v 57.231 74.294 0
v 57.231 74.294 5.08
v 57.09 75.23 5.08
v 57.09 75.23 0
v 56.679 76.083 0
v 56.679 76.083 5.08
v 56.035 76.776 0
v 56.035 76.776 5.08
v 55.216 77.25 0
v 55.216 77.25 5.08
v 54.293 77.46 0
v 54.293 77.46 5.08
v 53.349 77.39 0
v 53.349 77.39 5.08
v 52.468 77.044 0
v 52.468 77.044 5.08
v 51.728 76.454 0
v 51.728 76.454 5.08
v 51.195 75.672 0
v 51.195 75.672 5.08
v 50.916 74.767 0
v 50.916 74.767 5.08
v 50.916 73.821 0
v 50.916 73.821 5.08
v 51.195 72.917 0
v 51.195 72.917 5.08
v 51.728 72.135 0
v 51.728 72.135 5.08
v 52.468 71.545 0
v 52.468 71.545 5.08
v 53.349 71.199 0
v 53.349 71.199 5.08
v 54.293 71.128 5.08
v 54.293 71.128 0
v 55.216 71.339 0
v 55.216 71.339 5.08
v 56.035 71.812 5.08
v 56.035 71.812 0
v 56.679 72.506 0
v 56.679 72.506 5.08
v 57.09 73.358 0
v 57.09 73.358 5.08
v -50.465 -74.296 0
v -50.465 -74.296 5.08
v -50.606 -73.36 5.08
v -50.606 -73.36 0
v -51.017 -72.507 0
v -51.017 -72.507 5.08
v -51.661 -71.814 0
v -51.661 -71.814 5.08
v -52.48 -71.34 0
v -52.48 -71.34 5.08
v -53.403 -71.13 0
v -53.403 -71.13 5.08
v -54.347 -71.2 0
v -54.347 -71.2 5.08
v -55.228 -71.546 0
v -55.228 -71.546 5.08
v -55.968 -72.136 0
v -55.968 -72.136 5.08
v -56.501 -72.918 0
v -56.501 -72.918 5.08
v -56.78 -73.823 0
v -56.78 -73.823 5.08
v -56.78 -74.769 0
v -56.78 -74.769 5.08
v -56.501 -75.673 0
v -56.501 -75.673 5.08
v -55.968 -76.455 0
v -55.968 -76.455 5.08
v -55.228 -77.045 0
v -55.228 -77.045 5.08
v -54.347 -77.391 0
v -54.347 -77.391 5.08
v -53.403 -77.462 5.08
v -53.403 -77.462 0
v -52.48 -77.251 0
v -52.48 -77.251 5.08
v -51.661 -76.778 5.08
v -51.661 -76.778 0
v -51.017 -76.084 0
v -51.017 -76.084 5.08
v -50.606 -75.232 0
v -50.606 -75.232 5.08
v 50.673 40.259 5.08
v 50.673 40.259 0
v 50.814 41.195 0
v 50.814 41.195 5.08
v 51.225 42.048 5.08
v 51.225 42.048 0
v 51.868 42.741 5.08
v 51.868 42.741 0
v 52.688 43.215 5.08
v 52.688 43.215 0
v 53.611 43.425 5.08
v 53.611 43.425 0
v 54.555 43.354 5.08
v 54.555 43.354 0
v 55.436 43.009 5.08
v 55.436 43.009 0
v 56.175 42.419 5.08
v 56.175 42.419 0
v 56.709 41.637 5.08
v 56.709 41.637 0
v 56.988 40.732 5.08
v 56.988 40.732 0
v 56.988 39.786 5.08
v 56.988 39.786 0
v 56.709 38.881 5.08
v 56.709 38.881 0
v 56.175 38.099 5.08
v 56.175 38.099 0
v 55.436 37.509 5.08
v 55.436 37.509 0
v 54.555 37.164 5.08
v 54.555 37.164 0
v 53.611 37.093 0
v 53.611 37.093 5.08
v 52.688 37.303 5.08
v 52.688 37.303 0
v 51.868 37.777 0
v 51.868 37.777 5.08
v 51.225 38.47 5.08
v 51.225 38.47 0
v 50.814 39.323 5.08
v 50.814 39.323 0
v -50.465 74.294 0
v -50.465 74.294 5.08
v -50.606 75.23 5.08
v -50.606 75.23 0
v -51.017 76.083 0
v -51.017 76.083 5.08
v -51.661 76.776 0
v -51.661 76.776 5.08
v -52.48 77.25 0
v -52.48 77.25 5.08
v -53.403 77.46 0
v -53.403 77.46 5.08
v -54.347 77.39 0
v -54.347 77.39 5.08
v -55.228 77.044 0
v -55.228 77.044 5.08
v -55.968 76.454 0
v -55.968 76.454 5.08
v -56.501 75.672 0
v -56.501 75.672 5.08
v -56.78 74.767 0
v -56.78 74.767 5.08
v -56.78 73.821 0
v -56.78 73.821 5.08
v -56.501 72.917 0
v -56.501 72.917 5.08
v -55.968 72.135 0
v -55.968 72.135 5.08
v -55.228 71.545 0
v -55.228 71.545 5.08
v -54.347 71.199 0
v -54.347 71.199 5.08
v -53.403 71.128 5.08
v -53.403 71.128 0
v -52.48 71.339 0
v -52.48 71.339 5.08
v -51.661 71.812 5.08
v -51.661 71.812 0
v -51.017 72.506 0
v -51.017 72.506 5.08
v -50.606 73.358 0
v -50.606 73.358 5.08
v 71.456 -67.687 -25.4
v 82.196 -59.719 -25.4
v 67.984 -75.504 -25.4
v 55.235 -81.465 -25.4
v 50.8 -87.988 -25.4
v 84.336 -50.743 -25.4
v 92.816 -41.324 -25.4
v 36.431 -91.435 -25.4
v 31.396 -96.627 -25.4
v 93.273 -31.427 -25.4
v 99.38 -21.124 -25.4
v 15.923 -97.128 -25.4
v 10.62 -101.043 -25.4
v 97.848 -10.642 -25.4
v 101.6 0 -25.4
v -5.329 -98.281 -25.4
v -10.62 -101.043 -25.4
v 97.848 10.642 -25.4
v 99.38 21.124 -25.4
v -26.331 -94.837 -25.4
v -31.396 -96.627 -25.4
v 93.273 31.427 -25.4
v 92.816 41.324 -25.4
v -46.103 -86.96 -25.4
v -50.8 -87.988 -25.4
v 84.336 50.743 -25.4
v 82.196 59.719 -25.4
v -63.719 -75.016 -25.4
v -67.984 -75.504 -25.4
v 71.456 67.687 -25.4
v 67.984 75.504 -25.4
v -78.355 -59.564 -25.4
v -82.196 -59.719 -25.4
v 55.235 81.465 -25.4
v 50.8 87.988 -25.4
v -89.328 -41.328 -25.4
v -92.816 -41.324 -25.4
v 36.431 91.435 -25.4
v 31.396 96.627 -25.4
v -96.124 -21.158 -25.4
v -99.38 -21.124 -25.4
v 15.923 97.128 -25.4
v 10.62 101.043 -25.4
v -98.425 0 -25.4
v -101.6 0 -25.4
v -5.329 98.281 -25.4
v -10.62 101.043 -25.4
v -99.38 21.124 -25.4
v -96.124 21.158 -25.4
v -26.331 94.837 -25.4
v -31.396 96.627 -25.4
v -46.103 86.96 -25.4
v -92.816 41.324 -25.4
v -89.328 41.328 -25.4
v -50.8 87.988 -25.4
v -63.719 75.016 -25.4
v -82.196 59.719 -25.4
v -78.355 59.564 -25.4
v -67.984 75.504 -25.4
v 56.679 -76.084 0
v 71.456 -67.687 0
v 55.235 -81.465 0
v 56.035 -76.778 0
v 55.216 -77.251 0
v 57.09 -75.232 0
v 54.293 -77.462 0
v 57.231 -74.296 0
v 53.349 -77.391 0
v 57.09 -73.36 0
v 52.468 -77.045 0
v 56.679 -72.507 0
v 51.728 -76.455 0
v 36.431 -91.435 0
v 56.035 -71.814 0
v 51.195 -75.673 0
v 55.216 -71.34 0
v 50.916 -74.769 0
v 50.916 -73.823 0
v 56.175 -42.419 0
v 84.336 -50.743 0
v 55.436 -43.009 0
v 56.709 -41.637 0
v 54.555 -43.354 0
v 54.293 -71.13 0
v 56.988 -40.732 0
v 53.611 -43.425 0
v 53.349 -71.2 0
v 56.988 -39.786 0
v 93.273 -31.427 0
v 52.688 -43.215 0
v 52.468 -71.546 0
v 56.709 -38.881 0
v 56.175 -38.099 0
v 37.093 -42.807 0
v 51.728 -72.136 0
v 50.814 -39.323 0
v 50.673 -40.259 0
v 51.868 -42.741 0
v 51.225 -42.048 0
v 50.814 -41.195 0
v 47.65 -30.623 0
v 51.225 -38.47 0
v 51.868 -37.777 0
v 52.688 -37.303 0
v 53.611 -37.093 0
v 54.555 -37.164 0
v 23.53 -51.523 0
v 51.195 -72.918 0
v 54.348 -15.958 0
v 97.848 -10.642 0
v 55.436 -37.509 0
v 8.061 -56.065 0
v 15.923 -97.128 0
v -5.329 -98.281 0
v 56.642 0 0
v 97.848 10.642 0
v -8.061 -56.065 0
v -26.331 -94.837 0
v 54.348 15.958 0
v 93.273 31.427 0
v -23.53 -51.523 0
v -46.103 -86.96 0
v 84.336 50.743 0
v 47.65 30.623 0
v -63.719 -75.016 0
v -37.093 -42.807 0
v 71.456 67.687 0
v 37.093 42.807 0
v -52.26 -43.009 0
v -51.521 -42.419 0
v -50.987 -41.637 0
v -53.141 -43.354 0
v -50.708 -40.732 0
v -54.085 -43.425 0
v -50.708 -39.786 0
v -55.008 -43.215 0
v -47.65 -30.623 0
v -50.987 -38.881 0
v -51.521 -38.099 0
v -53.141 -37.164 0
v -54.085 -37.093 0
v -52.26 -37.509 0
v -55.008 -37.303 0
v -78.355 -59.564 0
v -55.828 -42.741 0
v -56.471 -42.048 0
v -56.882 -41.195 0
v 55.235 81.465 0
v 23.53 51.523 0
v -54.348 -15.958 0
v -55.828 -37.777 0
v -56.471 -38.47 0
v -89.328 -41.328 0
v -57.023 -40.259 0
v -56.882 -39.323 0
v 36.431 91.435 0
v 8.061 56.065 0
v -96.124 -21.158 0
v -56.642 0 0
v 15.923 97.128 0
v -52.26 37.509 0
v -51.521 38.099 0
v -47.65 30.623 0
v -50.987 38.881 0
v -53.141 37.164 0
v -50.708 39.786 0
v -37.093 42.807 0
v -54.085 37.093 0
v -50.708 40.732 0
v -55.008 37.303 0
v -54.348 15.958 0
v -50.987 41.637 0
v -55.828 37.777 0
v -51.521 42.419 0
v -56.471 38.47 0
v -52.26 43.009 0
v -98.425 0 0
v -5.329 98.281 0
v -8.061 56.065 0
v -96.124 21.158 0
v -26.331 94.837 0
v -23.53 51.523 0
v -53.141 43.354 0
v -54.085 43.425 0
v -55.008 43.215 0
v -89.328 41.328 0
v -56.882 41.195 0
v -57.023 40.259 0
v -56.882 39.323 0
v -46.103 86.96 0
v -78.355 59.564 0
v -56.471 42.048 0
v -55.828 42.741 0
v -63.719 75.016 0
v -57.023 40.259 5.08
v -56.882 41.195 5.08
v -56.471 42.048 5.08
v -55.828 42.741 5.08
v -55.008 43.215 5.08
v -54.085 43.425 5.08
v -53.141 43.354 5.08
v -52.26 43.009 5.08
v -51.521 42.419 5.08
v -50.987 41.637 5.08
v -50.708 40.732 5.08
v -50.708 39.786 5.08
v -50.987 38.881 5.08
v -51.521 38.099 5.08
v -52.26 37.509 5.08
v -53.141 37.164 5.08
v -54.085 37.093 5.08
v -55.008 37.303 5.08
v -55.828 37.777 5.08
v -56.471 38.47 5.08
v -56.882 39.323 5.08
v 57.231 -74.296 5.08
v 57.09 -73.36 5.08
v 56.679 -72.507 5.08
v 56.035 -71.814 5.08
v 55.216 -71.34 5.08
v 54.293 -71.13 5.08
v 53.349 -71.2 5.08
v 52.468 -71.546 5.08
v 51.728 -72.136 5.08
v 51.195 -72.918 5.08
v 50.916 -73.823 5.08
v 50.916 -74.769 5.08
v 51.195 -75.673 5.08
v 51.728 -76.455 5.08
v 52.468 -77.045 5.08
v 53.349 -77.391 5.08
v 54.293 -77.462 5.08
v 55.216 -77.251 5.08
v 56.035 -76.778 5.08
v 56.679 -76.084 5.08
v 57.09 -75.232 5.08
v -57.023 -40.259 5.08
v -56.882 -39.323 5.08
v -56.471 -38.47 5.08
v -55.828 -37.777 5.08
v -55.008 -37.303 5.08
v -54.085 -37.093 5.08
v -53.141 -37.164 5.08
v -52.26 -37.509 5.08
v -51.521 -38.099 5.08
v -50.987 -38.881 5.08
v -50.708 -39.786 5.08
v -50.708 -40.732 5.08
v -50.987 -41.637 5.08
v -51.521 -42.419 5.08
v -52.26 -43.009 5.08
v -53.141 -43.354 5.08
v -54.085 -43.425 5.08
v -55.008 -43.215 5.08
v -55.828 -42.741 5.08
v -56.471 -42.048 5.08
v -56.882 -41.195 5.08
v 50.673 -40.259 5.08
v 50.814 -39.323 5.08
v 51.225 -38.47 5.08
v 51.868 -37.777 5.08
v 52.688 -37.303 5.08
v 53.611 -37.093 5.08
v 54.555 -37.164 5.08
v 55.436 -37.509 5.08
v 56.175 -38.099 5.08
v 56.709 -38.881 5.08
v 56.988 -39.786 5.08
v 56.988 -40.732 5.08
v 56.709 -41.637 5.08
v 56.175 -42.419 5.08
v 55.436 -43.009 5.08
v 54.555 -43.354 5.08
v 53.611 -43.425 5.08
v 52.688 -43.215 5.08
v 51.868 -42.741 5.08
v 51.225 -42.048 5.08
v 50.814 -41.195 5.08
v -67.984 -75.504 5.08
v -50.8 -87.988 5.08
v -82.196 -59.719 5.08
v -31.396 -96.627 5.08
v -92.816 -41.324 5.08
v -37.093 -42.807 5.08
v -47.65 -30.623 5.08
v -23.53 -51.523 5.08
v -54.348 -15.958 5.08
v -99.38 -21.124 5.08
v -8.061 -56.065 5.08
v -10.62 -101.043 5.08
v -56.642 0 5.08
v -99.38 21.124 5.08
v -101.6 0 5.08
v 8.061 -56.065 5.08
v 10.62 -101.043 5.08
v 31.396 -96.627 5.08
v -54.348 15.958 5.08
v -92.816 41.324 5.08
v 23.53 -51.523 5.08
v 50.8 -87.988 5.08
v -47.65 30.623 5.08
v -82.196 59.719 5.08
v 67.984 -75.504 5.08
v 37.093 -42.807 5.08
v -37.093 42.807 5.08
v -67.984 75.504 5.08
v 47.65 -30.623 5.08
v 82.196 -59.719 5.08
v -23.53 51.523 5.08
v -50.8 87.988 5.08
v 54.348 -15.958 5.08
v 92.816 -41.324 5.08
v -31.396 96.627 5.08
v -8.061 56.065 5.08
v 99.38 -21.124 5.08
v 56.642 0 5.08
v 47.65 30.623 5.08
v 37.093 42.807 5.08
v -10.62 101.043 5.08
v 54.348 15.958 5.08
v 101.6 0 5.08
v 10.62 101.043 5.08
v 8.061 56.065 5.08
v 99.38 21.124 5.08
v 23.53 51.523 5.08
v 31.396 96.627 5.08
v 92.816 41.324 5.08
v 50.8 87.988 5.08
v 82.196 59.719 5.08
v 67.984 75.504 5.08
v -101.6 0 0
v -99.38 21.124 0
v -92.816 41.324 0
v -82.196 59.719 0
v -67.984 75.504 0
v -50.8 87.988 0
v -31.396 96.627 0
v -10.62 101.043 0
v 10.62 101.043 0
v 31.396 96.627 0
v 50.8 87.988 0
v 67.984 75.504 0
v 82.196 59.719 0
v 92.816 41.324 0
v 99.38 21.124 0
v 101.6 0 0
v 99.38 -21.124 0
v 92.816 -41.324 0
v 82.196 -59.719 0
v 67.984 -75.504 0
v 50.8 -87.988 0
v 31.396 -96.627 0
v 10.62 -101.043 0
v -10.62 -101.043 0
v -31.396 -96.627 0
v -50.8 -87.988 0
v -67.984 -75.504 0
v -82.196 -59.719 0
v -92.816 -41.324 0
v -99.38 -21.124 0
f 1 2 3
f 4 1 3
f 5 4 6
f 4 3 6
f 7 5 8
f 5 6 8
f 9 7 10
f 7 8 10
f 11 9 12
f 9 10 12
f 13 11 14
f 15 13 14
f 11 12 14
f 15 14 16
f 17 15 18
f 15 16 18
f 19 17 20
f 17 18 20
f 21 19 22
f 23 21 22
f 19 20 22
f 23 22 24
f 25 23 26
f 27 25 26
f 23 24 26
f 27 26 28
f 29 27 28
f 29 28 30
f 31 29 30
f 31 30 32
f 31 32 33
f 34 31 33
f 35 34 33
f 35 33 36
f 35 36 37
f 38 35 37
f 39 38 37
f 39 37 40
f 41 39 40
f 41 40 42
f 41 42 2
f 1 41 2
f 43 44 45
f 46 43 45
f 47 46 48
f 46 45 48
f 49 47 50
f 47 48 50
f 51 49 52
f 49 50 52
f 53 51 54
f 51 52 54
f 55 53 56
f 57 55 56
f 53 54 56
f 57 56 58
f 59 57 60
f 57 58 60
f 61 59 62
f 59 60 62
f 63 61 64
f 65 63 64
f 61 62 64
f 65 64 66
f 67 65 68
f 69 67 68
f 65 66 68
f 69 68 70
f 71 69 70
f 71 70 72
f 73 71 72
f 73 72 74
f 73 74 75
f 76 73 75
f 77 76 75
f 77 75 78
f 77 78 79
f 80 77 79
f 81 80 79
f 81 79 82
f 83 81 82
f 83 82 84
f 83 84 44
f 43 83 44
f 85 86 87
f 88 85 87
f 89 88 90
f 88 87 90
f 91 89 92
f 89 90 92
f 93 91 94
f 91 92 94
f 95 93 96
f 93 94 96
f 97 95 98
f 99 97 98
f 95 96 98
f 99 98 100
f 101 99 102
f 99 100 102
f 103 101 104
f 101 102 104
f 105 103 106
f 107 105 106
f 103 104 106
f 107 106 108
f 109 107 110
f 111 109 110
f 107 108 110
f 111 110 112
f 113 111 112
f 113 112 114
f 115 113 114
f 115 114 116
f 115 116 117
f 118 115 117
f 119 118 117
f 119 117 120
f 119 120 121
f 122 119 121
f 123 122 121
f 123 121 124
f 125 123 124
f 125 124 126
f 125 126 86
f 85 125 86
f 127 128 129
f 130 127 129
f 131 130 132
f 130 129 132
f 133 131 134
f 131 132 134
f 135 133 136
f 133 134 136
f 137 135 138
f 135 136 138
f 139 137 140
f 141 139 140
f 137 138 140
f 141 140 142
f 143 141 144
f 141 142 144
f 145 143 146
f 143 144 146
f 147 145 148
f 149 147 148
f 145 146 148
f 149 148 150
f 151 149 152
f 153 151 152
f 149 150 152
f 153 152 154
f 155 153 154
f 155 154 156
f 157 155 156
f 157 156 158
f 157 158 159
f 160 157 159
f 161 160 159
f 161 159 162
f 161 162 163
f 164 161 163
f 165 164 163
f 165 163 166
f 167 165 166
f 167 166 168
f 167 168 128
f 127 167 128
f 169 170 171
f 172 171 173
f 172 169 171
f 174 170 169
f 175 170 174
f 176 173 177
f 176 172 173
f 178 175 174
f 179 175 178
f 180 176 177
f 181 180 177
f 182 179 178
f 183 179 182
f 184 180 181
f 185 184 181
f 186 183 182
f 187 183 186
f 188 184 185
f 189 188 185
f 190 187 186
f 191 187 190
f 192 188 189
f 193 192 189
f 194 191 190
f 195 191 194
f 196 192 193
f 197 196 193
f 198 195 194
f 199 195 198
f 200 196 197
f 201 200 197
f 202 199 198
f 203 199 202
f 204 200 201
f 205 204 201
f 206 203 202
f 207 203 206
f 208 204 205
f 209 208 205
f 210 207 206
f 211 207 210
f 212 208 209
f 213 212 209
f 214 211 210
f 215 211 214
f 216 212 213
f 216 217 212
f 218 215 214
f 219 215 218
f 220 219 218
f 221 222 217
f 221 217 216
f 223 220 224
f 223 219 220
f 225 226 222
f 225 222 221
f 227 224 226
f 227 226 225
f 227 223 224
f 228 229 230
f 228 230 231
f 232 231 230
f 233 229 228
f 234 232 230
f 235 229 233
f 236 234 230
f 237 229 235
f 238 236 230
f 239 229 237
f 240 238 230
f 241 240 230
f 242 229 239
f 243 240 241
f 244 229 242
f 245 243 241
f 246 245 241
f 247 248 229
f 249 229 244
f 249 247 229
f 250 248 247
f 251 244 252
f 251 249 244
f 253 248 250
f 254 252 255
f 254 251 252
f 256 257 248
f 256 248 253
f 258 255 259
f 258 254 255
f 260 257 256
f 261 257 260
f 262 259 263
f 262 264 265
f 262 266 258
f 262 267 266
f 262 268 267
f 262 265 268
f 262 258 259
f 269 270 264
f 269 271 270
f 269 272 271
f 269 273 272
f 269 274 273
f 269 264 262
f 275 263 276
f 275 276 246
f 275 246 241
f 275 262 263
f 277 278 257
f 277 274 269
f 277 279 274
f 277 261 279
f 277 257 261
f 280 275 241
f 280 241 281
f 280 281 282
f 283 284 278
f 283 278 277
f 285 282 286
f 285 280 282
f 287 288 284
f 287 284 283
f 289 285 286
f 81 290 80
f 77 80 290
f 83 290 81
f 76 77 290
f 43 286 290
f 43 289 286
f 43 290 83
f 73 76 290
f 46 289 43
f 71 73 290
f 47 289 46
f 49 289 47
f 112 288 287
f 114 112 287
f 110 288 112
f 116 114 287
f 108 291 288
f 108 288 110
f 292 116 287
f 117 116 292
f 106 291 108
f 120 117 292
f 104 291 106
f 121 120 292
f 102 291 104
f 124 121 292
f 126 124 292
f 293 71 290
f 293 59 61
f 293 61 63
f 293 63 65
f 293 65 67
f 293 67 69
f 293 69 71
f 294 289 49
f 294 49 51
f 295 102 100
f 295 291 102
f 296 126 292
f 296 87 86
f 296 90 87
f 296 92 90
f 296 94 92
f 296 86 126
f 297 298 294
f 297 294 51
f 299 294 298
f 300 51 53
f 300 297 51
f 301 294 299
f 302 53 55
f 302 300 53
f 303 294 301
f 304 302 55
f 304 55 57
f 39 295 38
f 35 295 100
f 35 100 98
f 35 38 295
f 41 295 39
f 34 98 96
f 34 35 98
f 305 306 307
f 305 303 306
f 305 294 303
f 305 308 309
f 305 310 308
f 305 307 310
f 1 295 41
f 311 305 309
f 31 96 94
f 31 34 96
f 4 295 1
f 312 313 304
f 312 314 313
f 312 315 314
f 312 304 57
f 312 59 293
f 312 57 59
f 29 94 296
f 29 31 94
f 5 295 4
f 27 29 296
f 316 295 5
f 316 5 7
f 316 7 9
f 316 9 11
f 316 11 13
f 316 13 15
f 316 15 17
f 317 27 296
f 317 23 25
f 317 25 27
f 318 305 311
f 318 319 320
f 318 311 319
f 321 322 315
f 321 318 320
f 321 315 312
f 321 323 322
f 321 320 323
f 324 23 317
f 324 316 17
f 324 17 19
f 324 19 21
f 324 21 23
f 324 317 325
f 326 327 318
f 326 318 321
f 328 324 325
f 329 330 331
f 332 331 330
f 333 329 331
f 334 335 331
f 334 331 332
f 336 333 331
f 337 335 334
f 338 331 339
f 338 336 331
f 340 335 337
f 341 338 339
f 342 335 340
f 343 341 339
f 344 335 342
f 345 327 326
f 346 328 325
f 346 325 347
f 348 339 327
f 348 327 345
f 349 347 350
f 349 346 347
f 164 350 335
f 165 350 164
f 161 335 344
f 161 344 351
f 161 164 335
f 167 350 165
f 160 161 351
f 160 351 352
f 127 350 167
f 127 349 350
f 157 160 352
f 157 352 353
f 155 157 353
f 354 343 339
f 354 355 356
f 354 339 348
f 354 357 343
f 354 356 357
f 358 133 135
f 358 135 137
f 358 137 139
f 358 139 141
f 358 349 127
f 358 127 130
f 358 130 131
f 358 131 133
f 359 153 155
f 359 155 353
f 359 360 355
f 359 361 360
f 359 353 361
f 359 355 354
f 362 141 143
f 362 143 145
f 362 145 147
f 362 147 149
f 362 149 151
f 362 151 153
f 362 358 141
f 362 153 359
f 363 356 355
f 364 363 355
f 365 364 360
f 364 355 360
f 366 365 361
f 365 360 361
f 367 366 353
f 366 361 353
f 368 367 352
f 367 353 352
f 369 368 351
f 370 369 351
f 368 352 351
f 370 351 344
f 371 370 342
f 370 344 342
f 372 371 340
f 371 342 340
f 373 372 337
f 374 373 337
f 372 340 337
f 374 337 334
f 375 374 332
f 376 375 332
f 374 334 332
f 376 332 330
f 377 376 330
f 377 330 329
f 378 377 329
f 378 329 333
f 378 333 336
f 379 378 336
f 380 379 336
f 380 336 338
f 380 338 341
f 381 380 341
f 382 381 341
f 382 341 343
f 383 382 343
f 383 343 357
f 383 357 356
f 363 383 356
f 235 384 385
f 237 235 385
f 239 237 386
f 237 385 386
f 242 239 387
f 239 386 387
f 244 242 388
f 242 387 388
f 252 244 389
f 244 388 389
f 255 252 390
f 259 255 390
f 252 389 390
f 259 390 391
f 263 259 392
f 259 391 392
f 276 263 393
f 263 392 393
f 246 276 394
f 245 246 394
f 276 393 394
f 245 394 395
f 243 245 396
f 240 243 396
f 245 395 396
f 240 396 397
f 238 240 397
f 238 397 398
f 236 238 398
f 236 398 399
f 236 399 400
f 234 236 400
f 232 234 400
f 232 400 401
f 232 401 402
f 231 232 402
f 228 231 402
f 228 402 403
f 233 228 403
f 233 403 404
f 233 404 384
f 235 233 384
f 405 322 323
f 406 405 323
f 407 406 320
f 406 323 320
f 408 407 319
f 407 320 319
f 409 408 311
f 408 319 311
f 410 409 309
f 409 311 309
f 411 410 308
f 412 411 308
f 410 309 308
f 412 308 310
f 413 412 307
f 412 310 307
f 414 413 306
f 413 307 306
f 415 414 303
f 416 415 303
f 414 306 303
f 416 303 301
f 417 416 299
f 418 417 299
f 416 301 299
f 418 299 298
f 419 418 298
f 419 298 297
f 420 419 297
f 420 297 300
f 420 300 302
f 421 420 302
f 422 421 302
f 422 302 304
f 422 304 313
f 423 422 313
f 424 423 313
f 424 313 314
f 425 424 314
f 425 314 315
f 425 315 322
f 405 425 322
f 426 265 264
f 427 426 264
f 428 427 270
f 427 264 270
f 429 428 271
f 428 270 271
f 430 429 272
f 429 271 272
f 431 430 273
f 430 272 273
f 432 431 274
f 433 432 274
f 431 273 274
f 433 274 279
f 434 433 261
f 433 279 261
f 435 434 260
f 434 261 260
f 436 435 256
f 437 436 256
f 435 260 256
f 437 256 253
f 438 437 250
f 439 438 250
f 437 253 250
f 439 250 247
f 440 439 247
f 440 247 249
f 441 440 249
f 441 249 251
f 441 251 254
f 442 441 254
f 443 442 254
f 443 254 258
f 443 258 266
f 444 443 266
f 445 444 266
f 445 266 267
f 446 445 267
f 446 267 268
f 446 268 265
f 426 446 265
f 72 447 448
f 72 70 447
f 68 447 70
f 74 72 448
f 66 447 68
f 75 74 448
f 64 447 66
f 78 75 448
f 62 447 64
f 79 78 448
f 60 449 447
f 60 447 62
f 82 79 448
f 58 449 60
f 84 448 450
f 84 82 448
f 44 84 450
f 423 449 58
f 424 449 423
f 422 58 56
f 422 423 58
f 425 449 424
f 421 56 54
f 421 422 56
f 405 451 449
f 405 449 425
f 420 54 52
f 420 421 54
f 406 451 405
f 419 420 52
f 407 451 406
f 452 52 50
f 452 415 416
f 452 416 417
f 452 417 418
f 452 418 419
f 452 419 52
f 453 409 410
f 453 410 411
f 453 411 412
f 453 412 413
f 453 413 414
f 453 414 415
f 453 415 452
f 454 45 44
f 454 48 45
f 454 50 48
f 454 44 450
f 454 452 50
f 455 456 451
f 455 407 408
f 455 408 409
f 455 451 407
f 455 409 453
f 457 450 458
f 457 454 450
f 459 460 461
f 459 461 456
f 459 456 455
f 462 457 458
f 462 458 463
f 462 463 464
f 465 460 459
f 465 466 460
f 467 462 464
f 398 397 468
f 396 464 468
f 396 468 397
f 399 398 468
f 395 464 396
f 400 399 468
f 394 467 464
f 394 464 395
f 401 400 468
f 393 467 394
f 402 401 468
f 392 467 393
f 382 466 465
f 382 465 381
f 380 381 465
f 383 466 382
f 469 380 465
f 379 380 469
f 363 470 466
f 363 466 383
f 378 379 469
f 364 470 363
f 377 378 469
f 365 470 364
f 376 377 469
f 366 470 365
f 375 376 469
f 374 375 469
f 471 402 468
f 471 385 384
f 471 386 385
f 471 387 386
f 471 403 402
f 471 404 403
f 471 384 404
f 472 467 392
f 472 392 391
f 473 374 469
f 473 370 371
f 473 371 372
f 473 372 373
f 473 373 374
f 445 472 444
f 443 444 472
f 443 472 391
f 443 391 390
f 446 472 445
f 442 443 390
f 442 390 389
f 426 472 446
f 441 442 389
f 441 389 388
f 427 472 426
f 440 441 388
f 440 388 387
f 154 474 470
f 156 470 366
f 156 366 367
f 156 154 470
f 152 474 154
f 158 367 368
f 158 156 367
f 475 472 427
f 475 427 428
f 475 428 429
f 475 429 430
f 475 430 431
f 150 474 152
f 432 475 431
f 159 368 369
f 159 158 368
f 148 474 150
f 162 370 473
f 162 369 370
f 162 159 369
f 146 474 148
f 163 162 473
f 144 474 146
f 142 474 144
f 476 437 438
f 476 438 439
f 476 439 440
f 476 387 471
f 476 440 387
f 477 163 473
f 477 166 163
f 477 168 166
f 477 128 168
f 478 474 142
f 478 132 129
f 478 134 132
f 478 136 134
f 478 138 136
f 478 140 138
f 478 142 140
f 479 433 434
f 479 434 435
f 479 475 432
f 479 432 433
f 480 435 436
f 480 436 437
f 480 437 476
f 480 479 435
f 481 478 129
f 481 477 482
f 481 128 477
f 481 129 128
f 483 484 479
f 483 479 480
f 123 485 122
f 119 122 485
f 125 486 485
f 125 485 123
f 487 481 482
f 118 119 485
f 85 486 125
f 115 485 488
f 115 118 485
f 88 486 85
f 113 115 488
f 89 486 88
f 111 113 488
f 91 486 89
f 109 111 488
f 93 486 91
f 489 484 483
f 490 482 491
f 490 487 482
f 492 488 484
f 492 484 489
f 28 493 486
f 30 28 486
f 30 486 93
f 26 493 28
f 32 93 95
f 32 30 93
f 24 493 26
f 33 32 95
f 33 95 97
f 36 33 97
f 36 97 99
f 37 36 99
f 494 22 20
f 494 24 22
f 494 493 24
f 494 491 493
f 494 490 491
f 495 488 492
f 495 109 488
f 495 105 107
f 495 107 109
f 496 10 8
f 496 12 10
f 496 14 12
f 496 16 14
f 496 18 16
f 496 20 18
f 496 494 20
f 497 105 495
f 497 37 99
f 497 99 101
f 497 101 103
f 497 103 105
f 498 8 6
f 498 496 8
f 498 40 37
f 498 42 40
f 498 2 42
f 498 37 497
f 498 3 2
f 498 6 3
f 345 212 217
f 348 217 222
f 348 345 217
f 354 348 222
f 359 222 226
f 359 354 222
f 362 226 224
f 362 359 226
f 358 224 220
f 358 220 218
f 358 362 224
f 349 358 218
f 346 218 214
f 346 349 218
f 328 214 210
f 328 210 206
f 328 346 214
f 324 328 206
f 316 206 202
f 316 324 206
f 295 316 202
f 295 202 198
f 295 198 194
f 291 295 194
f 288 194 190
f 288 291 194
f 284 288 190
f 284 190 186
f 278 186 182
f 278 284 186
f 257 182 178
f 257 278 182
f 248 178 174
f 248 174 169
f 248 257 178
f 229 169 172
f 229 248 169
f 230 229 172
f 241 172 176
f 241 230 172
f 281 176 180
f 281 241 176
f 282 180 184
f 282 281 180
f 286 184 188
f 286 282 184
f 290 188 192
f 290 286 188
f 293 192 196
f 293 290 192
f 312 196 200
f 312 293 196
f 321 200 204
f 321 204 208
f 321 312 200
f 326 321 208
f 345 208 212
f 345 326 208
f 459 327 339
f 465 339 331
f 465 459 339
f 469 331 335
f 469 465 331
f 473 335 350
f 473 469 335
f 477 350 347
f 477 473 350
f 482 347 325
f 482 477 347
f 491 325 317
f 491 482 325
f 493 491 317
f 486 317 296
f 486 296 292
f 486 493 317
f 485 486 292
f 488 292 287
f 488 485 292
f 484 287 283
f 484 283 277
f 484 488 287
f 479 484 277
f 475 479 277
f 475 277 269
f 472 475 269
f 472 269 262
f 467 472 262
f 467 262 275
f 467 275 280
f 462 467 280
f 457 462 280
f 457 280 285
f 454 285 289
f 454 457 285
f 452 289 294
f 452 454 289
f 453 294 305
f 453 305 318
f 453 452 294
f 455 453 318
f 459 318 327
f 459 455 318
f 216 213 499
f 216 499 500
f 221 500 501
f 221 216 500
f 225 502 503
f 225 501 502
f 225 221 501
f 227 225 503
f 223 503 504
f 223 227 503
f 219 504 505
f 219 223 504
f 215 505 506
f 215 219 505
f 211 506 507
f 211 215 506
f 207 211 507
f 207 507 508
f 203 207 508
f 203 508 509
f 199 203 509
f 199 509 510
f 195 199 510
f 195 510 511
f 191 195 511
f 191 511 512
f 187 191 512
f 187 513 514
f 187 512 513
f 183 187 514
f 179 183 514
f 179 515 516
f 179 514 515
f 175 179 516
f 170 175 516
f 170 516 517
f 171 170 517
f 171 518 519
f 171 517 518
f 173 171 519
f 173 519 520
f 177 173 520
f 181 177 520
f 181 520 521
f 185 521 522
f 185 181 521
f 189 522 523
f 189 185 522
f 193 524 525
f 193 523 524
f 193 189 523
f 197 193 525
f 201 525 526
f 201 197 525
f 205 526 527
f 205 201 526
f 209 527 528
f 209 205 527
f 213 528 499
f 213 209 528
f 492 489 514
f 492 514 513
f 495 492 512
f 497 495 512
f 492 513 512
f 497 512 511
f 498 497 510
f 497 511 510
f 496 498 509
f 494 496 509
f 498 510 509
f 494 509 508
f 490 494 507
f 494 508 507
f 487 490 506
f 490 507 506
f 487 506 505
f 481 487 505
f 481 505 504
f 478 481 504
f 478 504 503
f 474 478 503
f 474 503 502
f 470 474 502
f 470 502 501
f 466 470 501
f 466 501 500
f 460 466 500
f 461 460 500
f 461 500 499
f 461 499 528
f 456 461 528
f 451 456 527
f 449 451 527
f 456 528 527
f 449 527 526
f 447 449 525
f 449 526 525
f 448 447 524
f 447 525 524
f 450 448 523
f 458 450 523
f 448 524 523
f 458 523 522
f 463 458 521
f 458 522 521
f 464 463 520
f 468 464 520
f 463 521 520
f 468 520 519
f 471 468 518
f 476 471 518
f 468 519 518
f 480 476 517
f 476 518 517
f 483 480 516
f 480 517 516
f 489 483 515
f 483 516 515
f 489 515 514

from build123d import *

# Parameters (mm, degrees)
SKETCH1_R           = 101.6
BOSS_EXTRUDE1_DEPTH = 5.08
BOSS_EXTRUDE2_START = 25.4
SKETCH4_R           = 101.6
BOSS_EXTRUDE2_DEPTH = 25.4
SKETCH5_R           = 56.642
BOSS_EXTRUDE3_DEPTH = 12.7
CUT_EXTRUDE3_START  = -64.008
SKETCH6_R           = 56.642
CUT_EXTRUDE3_DEPTH  = 64.008
CUT_EXTRUDE6_START  = -25.4
SKETCH10_R          = 98.425
SKETCH10_R_2        = 56.642
CUT_EXTRUDE6_DEPTH  = 25.4
SKETCH16_R          = 3.175
CUT_EXTRUDE7_DEPTH  = 6.35
SKETCH17_R          = 3.175
CUT_EXTRUDE8_DEPTH  = 7.874


with BuildPart() as part:
    # Sketch1 → Boss-Extrude1 (new body)
    with BuildSketch(Plane.XY):
        Circle(SKETCH1_R)
    extrude(amount=BOSS_EXTRUDE1_DEPTH)

    # Sketch4 → Boss-Extrude2 (add)
    with BuildSketch(Plane(origin=(0, 0, 0), x_dir=(-1, 0, 0), z_dir=(0, 0, -1)).offset(BOSS_EXTRUDE2_START)):
        Circle(SKETCH4_R)
    extrude(amount=-BOSS_EXTRUDE2_DEPTH)

    # Sketch5 → Boss-Extrude3 (add)
    with BuildSketch(Plane(origin=(0, 0, -25.4), x_dir=(-1, 0, 0), z_dir=(0, 0, -1))):
        Circle(SKETCH5_R)
    extrude(amount=BOSS_EXTRUDE3_DEPTH)

    # Sketch6 → Cut-Extrude3 (cut)
    with BuildSketch(Plane(origin=(0, 0, -38.1), x_dir=(-1, 0, 0), z_dir=(0, 0, -1)).offset(CUT_EXTRUDE3_START)):
        Circle(SKETCH6_R)
    extrude(amount=CUT_EXTRUDE3_DEPTH, mode=Mode.SUBTRACT)

    # Sketch10 → Cut-Extrude6 (cut)
    with BuildSketch(Plane(origin=(0, 0, -25.4), x_dir=(-1, 0, 0), z_dir=(0, 0, -1)).offset(CUT_EXTRUDE6_START)):
        Circle(SKETCH10_R)
        Circle(SKETCH10_R_2, mode=Mode.SUBTRACT)
    extrude(amount=CUT_EXTRUDE6_DEPTH, mode=Mode.SUBTRACT)

    # Sketch16 → Cut-Extrude7 (cut)
    with BuildSketch(Plane(origin=(0, 0, 0), x_dir=(-1, 0, 0), z_dir=(0, 0, -1))):
        with Locations((53.848, 40.259)):
            Circle(SKETCH16_R)
        with Locations((-53.848, 40.259)):
            Circle(SKETCH16_R)
        with Locations((-53.848, -40.259)):
            Circle(SKETCH16_R)
        with Locations((53.848, -40.259)):
            Circle(SKETCH16_R)
    extrude(amount=-CUT_EXTRUDE7_DEPTH, mode=Mode.SUBTRACT)

    # Sketch17 → Cut-Extrude8 (cut)
    with BuildSketch(Plane.XY.offset(5.08)):
        with Locations((54.055769112, 74.294164254)):
            Circle(SKETCH17_R)
        with Locations((-53.640230888, 74.294164254)):
            Circle(SKETCH17_R)
        with Locations((-53.640230888, -74.295835746)):
            Circle(SKETCH17_R)
        with Locations((54.055769112, -74.295835746)):
            Circle(SKETCH17_R)
    extrude(amount=-CUT_EXTRUDE8_DEPTH, mode=Mode.SUBTRACT)


solid = part.part
